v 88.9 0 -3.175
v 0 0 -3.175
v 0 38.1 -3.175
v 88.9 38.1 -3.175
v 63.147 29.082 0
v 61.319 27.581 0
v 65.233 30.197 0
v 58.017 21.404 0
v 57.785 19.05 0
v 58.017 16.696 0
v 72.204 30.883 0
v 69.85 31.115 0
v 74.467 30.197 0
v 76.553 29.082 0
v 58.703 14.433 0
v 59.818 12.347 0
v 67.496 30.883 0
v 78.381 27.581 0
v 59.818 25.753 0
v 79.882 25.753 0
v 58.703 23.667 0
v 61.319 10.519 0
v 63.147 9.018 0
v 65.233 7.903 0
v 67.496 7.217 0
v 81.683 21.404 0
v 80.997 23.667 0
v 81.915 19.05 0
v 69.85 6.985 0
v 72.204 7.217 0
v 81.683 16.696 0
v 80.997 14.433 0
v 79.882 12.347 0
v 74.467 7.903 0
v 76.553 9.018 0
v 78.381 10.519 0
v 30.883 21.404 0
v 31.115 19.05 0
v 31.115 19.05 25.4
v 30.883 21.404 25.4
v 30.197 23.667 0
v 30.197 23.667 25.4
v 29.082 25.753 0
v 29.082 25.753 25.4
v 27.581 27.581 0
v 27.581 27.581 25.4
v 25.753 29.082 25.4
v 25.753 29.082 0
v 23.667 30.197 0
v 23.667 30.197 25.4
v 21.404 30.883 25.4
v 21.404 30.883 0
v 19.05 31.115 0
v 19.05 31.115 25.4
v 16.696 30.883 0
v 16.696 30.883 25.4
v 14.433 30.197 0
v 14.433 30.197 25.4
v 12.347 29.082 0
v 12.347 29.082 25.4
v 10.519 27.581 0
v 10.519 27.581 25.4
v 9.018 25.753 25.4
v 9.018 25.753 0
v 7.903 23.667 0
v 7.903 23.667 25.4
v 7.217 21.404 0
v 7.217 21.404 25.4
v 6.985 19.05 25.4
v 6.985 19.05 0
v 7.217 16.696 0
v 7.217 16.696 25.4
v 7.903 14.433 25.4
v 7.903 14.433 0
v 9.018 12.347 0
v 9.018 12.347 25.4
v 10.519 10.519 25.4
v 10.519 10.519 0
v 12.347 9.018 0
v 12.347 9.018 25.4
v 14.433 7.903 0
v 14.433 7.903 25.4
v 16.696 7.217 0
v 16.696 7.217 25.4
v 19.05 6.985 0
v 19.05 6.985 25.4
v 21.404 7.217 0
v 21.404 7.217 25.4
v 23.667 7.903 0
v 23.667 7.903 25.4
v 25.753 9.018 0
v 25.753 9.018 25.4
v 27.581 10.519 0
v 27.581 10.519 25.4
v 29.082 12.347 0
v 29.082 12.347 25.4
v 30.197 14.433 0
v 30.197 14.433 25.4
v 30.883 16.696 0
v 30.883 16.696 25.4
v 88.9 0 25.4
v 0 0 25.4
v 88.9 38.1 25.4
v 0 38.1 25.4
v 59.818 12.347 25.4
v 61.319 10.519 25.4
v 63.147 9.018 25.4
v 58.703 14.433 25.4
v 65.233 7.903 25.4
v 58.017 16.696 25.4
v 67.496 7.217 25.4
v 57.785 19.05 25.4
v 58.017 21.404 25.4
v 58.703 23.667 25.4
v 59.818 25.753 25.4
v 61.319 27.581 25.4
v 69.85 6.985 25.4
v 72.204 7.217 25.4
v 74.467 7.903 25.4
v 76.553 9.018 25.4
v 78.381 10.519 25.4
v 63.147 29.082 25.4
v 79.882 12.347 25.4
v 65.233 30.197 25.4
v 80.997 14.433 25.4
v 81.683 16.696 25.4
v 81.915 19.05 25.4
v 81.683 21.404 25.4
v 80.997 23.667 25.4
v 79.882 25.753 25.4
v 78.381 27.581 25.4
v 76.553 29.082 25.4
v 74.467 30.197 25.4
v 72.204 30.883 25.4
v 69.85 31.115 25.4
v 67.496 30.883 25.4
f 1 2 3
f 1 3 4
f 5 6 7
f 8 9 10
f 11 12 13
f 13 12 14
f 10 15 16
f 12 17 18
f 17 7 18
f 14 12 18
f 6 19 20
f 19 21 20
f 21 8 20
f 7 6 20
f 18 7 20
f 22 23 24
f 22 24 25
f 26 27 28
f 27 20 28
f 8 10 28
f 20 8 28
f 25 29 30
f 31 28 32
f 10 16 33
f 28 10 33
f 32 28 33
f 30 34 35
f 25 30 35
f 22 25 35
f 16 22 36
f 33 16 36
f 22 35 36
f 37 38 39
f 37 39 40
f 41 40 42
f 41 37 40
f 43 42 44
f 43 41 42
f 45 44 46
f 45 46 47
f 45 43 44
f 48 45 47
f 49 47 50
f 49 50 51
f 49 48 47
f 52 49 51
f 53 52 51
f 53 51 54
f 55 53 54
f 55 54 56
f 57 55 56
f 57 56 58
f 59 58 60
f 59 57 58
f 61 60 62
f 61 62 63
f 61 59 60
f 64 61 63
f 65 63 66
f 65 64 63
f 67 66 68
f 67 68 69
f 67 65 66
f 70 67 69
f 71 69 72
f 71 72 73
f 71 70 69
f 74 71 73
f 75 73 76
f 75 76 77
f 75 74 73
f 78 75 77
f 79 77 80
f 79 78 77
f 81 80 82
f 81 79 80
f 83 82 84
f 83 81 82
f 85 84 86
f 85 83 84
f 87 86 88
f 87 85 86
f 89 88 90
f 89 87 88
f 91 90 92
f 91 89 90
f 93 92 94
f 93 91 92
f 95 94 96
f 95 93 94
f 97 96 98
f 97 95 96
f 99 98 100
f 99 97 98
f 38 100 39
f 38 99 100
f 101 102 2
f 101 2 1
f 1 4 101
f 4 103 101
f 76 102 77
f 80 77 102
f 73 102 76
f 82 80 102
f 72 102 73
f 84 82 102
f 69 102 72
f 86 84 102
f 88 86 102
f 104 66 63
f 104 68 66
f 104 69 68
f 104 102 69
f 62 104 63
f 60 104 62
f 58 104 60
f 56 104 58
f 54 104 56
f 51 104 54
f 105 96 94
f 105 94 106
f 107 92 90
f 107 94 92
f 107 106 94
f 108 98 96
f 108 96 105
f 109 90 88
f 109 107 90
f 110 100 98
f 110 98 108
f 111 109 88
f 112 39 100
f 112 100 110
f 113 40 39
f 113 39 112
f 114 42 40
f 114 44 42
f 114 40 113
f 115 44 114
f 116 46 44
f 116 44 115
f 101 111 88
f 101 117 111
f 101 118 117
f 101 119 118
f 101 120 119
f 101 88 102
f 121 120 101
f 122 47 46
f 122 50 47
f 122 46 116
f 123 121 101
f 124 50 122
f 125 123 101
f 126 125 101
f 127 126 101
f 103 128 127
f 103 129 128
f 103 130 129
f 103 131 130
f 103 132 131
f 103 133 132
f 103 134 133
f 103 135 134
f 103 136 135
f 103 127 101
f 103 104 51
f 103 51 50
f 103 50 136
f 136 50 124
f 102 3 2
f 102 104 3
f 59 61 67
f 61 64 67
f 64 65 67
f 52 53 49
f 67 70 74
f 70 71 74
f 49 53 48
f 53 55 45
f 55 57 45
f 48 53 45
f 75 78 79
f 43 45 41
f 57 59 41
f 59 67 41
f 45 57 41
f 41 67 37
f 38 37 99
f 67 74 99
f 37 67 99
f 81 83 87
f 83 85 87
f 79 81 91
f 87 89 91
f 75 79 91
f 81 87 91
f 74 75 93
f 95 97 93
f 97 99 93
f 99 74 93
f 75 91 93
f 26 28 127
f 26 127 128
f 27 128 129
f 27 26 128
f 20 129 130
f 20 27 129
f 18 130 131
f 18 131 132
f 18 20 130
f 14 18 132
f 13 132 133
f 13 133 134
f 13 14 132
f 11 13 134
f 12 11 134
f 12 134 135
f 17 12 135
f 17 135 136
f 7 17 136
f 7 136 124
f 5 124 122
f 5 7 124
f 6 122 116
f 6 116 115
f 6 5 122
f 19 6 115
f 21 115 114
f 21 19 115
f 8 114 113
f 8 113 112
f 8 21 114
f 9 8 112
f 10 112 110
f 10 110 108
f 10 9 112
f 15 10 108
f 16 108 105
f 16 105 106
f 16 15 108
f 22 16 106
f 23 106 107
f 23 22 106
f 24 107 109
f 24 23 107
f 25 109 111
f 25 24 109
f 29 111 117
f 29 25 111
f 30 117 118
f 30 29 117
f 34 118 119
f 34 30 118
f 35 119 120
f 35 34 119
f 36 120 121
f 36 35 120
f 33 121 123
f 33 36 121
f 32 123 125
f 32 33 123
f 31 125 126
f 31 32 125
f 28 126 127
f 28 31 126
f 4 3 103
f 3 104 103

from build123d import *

# Parameters (mm, degrees)
F0_W     = 88.9
F0_H     = 38.1
F0_R     = 12.065
F1_DEPTH = 25.4
F2_W     = 88.9
F2_H     = 38.1
F3_DEPTH = 3.175


with BuildPart() as f1:
    # F0 (on Top) → F1 (new body)
    with BuildSketch(Plane.XY):
        with Locations((44.45, 19.05)):
            Rectangle(F0_W, F0_H)
        with Locations((19.05, 19.05)):
            Circle(F0_R, mode=Mode.SUBTRACT)
        with Locations((69.85, 19.05)):
            Circle(F0_R, mode=Mode.SUBTRACT)
    extrude(amount=F1_DEPTH)

    # F2 (on face) → F3 (join)
    with BuildSketch(Plane(origin=(0, 0, 0), x_dir=(1, 0, 0), z_dir=(0, 0, -1))):
        with Locations((44.45, -19.05)):
            Rectangle(F2_W, F2_H)
    extrude(amount=F3_DEPTH)


solid = f1.part
